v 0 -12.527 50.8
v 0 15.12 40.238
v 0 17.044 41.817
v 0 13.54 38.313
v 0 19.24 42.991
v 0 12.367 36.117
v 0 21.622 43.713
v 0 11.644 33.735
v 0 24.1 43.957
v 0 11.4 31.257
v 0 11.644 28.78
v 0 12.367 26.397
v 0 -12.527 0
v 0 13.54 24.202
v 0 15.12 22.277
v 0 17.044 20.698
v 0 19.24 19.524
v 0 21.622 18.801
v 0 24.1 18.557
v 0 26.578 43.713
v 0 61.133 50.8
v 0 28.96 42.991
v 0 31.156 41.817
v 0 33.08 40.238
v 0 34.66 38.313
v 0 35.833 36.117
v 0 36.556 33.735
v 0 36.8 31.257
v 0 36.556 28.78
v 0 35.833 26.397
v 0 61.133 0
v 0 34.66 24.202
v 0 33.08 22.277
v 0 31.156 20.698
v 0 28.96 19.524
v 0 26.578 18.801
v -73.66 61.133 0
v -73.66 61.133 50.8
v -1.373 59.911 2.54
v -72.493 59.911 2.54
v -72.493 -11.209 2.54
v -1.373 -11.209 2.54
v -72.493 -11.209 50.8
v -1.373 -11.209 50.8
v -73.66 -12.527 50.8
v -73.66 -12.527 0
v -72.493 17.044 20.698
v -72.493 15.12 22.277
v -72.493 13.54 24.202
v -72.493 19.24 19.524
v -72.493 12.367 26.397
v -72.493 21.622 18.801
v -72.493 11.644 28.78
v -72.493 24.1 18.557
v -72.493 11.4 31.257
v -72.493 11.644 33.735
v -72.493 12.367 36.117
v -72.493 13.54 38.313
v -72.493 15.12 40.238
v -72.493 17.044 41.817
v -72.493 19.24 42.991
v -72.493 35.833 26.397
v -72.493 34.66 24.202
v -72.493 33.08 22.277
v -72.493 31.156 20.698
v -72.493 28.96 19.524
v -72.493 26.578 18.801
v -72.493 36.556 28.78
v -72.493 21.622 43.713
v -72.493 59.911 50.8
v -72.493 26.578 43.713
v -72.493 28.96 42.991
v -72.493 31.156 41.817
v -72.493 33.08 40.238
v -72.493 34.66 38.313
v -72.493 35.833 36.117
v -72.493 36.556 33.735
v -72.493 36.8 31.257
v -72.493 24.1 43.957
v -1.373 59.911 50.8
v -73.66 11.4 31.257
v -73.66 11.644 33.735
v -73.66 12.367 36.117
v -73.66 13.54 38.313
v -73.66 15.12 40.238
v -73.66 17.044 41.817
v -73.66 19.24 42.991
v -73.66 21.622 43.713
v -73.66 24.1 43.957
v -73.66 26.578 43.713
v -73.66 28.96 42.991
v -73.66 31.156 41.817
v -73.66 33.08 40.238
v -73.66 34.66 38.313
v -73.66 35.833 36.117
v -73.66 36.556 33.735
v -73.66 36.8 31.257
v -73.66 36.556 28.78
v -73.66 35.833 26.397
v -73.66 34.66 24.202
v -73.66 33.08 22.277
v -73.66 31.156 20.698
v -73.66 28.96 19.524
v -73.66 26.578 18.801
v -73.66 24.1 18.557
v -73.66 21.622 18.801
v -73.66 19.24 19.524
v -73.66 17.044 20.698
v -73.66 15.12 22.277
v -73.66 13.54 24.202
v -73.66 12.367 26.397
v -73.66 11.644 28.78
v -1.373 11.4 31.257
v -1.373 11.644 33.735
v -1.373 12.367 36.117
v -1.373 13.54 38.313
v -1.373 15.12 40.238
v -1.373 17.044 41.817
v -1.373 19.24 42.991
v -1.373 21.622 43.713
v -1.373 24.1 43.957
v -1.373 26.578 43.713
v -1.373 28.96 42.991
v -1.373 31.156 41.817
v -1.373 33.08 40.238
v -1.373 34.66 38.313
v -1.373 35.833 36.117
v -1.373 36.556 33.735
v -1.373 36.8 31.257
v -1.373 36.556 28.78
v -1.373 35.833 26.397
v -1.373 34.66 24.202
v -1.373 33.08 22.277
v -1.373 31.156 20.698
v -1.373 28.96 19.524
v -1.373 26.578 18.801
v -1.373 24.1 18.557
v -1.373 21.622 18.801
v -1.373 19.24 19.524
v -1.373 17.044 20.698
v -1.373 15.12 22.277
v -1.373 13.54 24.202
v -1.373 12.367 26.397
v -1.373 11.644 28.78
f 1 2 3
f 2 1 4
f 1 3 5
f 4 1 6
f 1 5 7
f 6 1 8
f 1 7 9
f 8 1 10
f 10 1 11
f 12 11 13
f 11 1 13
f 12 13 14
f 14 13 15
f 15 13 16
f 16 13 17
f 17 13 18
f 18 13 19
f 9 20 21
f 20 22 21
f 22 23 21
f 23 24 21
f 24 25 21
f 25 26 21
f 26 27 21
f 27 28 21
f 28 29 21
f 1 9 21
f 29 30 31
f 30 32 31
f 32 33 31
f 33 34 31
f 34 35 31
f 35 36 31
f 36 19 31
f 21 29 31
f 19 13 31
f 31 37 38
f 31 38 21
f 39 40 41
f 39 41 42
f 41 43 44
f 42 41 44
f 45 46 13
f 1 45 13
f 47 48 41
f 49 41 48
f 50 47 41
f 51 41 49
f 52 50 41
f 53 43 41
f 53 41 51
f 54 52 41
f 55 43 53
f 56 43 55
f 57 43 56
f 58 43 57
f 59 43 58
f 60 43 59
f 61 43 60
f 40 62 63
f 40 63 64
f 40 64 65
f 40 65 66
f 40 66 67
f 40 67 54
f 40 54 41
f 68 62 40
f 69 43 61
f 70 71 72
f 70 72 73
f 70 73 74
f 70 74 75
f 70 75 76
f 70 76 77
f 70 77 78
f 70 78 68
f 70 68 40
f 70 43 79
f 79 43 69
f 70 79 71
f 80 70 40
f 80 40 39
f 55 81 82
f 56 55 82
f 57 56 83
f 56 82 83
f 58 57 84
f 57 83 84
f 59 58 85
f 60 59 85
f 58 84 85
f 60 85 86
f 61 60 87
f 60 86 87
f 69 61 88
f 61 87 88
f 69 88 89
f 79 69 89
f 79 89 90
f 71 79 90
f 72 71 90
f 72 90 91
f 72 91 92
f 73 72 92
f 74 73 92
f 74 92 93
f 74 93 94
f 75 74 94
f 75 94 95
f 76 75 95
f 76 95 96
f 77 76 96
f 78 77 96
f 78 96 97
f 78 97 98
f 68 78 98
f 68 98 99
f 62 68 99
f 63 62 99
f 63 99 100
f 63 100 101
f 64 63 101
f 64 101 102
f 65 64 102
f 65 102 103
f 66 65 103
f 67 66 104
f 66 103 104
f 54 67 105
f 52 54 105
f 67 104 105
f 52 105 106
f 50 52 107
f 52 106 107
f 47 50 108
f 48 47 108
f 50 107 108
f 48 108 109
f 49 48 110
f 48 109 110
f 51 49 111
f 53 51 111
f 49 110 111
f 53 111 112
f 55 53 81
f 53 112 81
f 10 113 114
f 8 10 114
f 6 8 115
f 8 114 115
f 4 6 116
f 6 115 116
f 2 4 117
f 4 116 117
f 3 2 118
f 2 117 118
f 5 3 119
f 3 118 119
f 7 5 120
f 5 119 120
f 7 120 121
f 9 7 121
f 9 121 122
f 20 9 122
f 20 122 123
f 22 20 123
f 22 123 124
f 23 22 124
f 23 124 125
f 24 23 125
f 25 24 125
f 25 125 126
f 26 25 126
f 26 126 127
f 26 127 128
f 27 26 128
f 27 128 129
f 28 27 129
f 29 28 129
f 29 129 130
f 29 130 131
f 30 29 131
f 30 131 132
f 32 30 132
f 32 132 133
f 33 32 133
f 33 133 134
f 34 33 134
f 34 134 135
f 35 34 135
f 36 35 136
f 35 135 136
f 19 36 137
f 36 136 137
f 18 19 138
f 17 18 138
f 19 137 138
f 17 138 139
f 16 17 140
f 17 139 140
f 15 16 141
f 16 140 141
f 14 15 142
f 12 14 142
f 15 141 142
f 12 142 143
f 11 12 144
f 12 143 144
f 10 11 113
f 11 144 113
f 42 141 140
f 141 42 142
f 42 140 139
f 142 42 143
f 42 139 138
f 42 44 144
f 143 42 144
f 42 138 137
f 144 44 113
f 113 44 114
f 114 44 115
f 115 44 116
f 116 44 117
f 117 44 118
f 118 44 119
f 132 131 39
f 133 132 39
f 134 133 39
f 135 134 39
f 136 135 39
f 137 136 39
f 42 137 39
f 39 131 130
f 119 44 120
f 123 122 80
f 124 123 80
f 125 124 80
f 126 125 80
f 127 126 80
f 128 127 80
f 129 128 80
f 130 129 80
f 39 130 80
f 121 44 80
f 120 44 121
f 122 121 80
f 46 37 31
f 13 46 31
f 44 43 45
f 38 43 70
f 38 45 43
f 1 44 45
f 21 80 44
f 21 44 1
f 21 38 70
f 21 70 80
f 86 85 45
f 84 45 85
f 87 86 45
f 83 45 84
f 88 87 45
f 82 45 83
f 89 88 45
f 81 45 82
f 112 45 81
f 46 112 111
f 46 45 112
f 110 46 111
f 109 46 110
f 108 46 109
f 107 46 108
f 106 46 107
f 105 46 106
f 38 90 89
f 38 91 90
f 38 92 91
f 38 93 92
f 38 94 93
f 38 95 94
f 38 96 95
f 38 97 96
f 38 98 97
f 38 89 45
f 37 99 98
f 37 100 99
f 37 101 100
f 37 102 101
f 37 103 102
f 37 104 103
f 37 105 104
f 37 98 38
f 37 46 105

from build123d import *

# Parameters (mm, degrees)
F0_W     = 73.66
F0_H     = 73.66
F1_DEPTH = 50.8
F2_W     = 71.12
F2_H     = 71.12
F3_DEPTH = 48.26
F4_R     = 12.7
F5_DEPTH = 87.376


with BuildPart() as f1:
    # F0 (on Top) → F1 (new body)
    with BuildSketch(Plane.XY):
        with Locations((-36.83, 24.302927)):
            Rectangle(F0_W, F0_H)
    extrude(amount=F1_DEPTH)

    # F2 (on face) → F3 (cut)
    with BuildSketch(Plane.XY.offset(50.8)):
        with Locations((-36.933068, 24.351135)):
            Rectangle(F2_W, F2_H)
    extrude(amount=-F3_DEPTH, mode=Mode.SUBTRACT)

    # F4 (on face) → F5 (cut)
    with BuildSketch(Plane(origin=(-73.66, 0, 0), x_dir=(0, -1, 0), z_dir=(-1, 0, 0))):
        with Locations((-24.100089, 31.257417)):
            Circle(F4_R)
    extrude(amount=-F5_DEPTH, mode=Mode.SUBTRACT)


solid = f1.part
